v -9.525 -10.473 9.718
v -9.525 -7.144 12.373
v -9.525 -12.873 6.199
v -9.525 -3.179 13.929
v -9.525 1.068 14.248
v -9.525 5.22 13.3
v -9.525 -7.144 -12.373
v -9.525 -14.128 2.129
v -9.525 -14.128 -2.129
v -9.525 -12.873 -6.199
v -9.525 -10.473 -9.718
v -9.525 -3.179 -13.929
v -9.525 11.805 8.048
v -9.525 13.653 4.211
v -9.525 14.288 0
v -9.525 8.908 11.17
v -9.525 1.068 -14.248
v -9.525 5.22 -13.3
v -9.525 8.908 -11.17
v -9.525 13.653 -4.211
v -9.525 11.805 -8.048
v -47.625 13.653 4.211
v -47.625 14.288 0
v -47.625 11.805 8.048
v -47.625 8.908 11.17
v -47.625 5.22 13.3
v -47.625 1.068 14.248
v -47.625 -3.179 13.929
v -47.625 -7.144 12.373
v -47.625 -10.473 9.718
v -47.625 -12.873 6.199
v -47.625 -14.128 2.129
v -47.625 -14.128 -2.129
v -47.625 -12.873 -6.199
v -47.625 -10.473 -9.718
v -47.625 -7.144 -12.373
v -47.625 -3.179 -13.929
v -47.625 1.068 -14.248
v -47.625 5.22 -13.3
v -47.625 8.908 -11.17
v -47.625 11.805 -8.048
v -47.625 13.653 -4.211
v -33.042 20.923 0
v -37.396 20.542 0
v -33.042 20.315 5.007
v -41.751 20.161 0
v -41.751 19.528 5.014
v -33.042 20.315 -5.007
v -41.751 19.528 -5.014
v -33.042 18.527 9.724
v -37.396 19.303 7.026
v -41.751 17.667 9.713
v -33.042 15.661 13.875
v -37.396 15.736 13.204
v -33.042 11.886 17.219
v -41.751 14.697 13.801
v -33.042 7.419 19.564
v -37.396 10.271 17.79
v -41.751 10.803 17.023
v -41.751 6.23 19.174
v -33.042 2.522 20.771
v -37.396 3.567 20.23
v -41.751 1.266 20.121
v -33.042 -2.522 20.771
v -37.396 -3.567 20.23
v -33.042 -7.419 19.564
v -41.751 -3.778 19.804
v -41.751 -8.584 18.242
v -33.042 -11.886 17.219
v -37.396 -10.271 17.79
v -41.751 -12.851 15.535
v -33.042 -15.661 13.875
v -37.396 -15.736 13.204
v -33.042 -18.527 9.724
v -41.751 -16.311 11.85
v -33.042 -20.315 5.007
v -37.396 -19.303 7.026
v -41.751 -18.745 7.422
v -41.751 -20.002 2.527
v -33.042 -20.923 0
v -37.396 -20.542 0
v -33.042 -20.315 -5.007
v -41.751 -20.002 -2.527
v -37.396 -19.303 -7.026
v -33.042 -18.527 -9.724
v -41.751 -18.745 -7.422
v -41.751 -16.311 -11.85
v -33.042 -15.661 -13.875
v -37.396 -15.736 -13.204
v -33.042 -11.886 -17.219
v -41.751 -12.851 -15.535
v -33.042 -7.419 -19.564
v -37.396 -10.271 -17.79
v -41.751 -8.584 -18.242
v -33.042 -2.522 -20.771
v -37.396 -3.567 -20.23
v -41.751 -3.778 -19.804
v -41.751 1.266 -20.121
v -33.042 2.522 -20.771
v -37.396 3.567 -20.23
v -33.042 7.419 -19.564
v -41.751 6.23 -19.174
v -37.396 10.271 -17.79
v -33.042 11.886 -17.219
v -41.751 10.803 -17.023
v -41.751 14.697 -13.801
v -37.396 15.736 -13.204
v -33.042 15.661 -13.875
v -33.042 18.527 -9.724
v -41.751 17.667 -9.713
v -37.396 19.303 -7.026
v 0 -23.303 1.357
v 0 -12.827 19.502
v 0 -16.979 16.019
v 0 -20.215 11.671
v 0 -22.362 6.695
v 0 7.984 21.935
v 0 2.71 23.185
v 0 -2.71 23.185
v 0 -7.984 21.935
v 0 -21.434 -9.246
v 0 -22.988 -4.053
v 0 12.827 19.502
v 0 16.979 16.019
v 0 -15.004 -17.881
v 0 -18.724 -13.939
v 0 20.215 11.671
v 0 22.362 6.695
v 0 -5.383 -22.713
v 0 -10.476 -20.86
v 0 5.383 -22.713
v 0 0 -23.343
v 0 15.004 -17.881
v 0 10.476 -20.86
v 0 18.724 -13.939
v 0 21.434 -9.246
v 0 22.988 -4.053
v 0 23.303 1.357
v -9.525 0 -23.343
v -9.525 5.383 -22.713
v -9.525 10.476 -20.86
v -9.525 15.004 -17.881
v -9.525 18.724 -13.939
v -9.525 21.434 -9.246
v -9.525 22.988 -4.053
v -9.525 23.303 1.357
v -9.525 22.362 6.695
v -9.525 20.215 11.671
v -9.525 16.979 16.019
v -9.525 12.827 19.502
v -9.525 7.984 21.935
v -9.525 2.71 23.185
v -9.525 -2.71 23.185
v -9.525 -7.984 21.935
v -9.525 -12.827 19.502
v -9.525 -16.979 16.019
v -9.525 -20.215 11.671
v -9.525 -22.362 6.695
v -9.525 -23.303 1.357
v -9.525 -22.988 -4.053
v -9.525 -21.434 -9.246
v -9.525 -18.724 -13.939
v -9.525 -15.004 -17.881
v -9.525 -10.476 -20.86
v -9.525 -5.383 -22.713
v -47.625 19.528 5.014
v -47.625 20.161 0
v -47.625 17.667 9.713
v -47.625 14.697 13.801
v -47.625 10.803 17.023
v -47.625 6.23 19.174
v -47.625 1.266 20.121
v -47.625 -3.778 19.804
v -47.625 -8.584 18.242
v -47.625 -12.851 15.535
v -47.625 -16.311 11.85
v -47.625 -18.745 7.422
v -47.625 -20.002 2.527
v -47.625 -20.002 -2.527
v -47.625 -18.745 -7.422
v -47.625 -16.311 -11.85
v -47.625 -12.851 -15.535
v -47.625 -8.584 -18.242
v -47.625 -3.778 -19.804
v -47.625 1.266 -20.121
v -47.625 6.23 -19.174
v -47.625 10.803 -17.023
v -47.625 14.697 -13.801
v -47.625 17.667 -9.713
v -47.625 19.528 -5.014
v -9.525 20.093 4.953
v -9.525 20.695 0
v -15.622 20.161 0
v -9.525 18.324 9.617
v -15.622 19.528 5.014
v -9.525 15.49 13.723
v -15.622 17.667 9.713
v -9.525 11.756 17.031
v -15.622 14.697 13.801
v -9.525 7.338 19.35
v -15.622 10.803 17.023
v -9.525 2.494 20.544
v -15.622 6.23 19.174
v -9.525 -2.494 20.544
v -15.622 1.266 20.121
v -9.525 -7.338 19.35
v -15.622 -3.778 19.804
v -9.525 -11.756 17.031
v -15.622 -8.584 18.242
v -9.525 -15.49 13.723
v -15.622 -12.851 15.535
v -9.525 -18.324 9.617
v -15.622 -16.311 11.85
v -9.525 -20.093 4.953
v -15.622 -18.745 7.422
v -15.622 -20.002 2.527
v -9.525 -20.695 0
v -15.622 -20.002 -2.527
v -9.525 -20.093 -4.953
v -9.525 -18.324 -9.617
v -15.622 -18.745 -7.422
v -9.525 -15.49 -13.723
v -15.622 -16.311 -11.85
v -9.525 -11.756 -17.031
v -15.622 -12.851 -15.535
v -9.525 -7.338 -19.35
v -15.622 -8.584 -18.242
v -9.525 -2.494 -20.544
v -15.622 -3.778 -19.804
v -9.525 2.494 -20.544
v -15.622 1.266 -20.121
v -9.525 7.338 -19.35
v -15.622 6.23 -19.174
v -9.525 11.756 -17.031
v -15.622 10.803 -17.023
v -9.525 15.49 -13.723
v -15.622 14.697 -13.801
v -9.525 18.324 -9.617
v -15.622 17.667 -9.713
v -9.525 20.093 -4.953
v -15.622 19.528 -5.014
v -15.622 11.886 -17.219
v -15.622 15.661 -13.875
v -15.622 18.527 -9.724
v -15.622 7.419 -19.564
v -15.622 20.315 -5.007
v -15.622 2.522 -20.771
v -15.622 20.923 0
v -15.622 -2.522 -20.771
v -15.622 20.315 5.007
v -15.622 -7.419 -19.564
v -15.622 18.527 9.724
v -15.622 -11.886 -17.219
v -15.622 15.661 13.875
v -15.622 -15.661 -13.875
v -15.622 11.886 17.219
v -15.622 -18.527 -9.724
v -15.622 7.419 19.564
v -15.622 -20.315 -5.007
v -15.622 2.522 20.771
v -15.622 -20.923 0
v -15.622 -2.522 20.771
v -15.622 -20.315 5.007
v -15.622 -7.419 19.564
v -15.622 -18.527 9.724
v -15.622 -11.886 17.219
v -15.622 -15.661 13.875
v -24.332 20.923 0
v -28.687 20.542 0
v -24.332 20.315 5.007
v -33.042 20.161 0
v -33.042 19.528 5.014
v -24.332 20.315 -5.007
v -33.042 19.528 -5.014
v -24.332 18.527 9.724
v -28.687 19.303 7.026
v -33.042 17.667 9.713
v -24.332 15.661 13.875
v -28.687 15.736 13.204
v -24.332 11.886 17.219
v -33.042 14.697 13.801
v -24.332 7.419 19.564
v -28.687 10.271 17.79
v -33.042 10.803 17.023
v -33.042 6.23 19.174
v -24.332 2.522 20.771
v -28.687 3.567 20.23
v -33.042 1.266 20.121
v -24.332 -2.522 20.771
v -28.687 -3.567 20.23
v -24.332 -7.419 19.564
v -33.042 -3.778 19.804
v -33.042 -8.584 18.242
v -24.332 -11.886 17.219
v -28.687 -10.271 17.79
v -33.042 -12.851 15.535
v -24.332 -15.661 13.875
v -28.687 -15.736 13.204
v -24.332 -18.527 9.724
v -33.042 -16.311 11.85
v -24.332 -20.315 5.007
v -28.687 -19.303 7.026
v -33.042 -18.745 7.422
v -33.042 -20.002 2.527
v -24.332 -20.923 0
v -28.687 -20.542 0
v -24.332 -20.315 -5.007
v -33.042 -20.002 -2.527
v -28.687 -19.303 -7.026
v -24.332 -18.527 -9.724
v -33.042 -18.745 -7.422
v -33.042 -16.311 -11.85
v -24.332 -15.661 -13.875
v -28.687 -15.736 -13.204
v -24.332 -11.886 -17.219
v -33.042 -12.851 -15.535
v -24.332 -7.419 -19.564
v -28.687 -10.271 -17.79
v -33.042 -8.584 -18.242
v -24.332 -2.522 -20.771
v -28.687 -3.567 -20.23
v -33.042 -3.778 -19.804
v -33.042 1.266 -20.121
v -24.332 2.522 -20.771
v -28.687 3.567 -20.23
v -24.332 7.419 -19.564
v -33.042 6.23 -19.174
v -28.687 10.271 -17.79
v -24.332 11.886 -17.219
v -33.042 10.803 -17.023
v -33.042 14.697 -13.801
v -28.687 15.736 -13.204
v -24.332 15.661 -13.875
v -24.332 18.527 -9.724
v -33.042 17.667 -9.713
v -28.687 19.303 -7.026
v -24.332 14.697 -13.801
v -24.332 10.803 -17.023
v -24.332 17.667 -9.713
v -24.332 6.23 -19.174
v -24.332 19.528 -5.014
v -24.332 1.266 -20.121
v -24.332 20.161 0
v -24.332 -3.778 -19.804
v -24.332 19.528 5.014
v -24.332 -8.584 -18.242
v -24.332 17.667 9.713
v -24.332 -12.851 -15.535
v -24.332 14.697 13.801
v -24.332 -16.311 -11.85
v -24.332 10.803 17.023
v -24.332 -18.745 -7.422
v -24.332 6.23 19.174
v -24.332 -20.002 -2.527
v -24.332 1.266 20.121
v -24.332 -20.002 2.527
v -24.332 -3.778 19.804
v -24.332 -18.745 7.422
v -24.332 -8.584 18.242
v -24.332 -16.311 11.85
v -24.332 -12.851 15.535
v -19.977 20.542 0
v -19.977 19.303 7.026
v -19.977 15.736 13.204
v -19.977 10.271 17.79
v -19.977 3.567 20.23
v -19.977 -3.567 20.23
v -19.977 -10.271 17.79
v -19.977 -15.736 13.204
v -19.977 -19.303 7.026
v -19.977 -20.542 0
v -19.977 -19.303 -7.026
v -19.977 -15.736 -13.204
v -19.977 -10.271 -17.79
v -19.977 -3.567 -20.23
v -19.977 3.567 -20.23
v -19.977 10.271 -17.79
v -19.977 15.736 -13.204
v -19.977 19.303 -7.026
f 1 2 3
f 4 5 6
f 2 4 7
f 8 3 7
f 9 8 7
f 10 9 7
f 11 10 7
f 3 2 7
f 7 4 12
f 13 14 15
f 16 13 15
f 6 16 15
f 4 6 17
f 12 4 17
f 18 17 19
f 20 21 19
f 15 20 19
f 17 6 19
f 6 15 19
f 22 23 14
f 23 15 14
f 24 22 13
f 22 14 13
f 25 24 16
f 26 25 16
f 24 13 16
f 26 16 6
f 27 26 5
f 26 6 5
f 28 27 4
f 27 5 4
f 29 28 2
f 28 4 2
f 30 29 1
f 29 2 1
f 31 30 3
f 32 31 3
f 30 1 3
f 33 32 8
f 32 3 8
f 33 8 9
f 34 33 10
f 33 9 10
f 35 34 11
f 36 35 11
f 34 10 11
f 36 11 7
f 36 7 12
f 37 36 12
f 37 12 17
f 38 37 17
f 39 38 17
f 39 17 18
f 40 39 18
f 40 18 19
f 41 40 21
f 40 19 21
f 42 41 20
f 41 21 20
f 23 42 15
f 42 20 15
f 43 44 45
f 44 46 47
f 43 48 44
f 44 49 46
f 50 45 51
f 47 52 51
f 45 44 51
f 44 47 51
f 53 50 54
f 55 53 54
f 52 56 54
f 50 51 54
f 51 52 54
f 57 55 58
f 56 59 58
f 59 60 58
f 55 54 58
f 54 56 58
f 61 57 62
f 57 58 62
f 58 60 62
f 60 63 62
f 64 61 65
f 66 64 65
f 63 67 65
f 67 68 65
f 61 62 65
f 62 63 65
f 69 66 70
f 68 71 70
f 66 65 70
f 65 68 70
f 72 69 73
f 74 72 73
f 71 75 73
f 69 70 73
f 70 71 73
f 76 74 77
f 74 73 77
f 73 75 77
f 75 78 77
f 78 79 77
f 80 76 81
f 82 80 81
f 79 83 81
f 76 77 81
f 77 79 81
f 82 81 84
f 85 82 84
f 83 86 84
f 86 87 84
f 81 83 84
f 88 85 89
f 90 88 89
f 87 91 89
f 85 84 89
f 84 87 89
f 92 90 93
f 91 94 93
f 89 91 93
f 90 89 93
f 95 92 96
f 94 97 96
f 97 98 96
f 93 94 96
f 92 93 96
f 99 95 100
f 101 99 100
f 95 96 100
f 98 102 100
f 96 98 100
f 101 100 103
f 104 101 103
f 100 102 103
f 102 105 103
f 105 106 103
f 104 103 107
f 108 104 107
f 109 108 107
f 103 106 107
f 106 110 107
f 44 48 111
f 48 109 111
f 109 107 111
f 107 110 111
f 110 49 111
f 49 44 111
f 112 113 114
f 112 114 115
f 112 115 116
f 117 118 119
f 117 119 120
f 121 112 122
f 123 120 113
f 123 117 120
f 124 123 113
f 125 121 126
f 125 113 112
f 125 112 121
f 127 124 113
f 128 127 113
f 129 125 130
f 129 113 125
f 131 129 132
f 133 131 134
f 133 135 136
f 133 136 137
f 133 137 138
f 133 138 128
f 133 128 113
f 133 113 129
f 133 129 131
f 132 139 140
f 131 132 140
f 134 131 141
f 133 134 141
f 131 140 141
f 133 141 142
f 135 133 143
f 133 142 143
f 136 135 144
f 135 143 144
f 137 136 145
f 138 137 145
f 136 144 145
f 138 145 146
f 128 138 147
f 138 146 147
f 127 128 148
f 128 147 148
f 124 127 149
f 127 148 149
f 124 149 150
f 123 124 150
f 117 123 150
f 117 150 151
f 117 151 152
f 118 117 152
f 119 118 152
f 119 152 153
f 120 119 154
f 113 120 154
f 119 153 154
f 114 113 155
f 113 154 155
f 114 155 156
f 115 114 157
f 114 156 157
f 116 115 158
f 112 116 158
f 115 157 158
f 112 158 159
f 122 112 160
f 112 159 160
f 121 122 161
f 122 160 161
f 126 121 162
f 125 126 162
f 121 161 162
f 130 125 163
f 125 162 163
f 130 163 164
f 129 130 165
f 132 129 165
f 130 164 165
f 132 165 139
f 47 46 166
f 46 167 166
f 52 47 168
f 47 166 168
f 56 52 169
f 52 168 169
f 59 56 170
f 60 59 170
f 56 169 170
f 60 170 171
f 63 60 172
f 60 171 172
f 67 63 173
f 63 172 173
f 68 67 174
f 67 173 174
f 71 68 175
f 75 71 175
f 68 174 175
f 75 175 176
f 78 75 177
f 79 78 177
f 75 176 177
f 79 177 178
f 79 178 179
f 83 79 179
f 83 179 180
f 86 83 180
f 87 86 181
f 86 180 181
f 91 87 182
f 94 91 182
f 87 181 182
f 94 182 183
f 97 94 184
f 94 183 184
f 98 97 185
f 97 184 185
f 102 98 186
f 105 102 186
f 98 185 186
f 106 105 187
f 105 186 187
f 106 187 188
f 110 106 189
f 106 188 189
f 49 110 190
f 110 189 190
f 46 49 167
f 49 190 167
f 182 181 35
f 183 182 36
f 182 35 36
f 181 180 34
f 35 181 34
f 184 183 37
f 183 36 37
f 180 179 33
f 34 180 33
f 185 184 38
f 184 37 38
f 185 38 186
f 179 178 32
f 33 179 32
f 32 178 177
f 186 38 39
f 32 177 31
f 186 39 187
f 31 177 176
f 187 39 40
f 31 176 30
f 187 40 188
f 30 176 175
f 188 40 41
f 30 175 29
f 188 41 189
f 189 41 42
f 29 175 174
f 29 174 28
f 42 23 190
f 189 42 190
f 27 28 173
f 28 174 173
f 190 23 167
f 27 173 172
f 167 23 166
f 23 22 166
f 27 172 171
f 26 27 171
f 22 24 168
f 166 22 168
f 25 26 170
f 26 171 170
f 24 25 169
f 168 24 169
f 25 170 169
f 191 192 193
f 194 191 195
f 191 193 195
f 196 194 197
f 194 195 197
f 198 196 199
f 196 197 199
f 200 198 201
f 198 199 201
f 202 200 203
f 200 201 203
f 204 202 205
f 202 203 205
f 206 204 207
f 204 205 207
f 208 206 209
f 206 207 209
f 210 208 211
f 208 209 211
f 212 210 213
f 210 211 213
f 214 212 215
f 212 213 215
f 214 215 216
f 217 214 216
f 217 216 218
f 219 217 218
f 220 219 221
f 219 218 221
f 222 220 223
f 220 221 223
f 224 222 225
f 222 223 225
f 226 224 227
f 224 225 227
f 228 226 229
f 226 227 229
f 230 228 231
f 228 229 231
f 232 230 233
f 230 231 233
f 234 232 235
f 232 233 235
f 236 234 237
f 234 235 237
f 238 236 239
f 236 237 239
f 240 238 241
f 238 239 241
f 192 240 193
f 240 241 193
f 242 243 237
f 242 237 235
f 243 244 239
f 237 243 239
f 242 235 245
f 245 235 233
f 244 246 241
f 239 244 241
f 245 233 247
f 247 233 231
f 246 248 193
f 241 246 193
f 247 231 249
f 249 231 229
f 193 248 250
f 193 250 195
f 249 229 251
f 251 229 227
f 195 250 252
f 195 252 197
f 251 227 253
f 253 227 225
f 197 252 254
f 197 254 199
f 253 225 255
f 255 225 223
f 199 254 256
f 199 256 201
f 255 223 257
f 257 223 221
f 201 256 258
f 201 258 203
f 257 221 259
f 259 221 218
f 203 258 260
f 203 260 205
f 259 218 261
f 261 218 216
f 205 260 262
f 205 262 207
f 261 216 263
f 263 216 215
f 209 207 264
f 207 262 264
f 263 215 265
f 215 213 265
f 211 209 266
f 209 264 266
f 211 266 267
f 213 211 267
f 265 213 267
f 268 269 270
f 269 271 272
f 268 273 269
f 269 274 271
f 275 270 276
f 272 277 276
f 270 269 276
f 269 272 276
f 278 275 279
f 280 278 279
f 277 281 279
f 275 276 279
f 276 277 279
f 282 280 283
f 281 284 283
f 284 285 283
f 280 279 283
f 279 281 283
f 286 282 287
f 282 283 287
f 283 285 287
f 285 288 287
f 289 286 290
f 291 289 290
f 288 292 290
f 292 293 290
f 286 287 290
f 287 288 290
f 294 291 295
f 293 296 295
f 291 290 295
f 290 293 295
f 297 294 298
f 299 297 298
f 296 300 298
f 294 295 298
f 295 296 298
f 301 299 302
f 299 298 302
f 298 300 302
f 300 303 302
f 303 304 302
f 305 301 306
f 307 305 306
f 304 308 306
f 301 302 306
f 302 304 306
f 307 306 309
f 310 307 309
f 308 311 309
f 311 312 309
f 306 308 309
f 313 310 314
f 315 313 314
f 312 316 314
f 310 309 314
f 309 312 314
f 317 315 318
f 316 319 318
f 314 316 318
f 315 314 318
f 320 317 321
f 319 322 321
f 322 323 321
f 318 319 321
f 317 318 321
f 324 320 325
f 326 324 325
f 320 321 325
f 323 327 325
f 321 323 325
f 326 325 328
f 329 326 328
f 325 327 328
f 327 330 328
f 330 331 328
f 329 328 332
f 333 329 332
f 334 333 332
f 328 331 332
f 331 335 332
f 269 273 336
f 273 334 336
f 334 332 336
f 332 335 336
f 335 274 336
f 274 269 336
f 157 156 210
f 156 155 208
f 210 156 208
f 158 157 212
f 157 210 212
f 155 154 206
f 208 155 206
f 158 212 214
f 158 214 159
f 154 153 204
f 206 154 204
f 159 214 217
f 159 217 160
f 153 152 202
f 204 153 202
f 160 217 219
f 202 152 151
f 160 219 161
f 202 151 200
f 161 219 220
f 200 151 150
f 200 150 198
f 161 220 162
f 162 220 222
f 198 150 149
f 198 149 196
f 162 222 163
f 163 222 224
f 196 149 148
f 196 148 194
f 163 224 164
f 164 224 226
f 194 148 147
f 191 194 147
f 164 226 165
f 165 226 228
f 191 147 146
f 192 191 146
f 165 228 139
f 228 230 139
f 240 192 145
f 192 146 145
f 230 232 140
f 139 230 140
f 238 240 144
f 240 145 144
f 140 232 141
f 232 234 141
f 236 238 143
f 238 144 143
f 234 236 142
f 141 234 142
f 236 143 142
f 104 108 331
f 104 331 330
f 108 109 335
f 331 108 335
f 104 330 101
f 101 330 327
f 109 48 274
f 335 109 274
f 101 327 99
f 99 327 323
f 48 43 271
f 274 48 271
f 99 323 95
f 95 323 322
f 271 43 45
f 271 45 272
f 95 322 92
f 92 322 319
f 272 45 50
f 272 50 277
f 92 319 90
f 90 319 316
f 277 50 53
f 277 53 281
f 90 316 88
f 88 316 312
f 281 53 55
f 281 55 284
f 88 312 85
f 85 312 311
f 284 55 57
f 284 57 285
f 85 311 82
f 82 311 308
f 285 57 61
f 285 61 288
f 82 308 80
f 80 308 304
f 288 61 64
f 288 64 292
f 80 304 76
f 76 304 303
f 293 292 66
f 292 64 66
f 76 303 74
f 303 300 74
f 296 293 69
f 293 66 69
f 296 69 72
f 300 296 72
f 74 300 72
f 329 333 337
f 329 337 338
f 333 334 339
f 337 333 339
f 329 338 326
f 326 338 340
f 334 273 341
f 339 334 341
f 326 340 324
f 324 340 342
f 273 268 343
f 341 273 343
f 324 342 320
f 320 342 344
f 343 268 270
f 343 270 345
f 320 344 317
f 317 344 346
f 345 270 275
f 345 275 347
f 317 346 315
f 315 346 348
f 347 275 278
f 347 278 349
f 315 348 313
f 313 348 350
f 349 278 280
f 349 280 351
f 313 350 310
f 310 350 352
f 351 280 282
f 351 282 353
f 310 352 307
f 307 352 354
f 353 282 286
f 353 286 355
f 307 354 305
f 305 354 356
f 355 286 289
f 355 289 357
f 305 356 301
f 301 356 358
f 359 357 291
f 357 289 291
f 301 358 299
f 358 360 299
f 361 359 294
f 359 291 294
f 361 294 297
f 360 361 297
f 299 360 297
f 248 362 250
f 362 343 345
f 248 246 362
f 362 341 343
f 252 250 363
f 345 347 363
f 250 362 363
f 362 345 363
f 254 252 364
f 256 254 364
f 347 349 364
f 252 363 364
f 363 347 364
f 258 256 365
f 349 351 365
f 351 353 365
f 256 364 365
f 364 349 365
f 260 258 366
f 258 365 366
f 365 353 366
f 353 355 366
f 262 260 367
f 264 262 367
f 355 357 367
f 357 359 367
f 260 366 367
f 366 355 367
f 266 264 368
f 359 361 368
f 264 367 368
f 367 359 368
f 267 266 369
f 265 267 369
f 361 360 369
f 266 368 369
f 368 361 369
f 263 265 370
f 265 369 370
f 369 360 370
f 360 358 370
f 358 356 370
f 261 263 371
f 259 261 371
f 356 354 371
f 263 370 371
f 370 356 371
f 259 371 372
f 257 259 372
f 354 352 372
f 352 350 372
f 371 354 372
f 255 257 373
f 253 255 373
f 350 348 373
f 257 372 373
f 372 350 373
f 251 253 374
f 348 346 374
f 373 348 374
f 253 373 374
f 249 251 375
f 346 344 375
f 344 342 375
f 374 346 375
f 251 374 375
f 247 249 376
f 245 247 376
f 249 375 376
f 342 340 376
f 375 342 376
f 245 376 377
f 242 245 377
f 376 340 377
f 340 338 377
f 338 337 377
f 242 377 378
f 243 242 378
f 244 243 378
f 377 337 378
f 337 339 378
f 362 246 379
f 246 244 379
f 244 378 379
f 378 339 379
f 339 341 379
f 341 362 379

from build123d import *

# Parameters (mm, degrees)
SKETCH2_R           = 23.3426
BOSS_EXTRUDE1_DEPTH = 9.525


with BuildPart() as part:
    # Sketch1 → Revolve1 (revolve)
    with BuildSketch(Plane.XY):
        Polygon((-47.625, 14.2875), (-9.525, 14.2875), (-9.525, 20.16125), (-6.912450581, 20.16125), (-6.912450581, 20.92325), (-15.622150436, 20.16125), (-15.622150436, 20.92325), (-24.331850291, 20.16125), (-24.331850291, 20.92325), (-33.041550145, 20.16125), (-33.041550145, 20.92325), (-41.75125, 20.16125), (-47.625, 20.16125), align=None)
    revolve(axis=Axis((-47.625, 0, 0), (1, 0, 0)))

    # Sketch2 → Boss-Extrude1 (add)
    with BuildSketch(Plane(origin=(-9.525, 0, 0), x_dir=(0, 0, -1), z_dir=(1, 0, 0))):
        Circle(SKETCH2_R)
    extrude(amount=BOSS_EXTRUDE1_DEPTH)


solid = part.part
